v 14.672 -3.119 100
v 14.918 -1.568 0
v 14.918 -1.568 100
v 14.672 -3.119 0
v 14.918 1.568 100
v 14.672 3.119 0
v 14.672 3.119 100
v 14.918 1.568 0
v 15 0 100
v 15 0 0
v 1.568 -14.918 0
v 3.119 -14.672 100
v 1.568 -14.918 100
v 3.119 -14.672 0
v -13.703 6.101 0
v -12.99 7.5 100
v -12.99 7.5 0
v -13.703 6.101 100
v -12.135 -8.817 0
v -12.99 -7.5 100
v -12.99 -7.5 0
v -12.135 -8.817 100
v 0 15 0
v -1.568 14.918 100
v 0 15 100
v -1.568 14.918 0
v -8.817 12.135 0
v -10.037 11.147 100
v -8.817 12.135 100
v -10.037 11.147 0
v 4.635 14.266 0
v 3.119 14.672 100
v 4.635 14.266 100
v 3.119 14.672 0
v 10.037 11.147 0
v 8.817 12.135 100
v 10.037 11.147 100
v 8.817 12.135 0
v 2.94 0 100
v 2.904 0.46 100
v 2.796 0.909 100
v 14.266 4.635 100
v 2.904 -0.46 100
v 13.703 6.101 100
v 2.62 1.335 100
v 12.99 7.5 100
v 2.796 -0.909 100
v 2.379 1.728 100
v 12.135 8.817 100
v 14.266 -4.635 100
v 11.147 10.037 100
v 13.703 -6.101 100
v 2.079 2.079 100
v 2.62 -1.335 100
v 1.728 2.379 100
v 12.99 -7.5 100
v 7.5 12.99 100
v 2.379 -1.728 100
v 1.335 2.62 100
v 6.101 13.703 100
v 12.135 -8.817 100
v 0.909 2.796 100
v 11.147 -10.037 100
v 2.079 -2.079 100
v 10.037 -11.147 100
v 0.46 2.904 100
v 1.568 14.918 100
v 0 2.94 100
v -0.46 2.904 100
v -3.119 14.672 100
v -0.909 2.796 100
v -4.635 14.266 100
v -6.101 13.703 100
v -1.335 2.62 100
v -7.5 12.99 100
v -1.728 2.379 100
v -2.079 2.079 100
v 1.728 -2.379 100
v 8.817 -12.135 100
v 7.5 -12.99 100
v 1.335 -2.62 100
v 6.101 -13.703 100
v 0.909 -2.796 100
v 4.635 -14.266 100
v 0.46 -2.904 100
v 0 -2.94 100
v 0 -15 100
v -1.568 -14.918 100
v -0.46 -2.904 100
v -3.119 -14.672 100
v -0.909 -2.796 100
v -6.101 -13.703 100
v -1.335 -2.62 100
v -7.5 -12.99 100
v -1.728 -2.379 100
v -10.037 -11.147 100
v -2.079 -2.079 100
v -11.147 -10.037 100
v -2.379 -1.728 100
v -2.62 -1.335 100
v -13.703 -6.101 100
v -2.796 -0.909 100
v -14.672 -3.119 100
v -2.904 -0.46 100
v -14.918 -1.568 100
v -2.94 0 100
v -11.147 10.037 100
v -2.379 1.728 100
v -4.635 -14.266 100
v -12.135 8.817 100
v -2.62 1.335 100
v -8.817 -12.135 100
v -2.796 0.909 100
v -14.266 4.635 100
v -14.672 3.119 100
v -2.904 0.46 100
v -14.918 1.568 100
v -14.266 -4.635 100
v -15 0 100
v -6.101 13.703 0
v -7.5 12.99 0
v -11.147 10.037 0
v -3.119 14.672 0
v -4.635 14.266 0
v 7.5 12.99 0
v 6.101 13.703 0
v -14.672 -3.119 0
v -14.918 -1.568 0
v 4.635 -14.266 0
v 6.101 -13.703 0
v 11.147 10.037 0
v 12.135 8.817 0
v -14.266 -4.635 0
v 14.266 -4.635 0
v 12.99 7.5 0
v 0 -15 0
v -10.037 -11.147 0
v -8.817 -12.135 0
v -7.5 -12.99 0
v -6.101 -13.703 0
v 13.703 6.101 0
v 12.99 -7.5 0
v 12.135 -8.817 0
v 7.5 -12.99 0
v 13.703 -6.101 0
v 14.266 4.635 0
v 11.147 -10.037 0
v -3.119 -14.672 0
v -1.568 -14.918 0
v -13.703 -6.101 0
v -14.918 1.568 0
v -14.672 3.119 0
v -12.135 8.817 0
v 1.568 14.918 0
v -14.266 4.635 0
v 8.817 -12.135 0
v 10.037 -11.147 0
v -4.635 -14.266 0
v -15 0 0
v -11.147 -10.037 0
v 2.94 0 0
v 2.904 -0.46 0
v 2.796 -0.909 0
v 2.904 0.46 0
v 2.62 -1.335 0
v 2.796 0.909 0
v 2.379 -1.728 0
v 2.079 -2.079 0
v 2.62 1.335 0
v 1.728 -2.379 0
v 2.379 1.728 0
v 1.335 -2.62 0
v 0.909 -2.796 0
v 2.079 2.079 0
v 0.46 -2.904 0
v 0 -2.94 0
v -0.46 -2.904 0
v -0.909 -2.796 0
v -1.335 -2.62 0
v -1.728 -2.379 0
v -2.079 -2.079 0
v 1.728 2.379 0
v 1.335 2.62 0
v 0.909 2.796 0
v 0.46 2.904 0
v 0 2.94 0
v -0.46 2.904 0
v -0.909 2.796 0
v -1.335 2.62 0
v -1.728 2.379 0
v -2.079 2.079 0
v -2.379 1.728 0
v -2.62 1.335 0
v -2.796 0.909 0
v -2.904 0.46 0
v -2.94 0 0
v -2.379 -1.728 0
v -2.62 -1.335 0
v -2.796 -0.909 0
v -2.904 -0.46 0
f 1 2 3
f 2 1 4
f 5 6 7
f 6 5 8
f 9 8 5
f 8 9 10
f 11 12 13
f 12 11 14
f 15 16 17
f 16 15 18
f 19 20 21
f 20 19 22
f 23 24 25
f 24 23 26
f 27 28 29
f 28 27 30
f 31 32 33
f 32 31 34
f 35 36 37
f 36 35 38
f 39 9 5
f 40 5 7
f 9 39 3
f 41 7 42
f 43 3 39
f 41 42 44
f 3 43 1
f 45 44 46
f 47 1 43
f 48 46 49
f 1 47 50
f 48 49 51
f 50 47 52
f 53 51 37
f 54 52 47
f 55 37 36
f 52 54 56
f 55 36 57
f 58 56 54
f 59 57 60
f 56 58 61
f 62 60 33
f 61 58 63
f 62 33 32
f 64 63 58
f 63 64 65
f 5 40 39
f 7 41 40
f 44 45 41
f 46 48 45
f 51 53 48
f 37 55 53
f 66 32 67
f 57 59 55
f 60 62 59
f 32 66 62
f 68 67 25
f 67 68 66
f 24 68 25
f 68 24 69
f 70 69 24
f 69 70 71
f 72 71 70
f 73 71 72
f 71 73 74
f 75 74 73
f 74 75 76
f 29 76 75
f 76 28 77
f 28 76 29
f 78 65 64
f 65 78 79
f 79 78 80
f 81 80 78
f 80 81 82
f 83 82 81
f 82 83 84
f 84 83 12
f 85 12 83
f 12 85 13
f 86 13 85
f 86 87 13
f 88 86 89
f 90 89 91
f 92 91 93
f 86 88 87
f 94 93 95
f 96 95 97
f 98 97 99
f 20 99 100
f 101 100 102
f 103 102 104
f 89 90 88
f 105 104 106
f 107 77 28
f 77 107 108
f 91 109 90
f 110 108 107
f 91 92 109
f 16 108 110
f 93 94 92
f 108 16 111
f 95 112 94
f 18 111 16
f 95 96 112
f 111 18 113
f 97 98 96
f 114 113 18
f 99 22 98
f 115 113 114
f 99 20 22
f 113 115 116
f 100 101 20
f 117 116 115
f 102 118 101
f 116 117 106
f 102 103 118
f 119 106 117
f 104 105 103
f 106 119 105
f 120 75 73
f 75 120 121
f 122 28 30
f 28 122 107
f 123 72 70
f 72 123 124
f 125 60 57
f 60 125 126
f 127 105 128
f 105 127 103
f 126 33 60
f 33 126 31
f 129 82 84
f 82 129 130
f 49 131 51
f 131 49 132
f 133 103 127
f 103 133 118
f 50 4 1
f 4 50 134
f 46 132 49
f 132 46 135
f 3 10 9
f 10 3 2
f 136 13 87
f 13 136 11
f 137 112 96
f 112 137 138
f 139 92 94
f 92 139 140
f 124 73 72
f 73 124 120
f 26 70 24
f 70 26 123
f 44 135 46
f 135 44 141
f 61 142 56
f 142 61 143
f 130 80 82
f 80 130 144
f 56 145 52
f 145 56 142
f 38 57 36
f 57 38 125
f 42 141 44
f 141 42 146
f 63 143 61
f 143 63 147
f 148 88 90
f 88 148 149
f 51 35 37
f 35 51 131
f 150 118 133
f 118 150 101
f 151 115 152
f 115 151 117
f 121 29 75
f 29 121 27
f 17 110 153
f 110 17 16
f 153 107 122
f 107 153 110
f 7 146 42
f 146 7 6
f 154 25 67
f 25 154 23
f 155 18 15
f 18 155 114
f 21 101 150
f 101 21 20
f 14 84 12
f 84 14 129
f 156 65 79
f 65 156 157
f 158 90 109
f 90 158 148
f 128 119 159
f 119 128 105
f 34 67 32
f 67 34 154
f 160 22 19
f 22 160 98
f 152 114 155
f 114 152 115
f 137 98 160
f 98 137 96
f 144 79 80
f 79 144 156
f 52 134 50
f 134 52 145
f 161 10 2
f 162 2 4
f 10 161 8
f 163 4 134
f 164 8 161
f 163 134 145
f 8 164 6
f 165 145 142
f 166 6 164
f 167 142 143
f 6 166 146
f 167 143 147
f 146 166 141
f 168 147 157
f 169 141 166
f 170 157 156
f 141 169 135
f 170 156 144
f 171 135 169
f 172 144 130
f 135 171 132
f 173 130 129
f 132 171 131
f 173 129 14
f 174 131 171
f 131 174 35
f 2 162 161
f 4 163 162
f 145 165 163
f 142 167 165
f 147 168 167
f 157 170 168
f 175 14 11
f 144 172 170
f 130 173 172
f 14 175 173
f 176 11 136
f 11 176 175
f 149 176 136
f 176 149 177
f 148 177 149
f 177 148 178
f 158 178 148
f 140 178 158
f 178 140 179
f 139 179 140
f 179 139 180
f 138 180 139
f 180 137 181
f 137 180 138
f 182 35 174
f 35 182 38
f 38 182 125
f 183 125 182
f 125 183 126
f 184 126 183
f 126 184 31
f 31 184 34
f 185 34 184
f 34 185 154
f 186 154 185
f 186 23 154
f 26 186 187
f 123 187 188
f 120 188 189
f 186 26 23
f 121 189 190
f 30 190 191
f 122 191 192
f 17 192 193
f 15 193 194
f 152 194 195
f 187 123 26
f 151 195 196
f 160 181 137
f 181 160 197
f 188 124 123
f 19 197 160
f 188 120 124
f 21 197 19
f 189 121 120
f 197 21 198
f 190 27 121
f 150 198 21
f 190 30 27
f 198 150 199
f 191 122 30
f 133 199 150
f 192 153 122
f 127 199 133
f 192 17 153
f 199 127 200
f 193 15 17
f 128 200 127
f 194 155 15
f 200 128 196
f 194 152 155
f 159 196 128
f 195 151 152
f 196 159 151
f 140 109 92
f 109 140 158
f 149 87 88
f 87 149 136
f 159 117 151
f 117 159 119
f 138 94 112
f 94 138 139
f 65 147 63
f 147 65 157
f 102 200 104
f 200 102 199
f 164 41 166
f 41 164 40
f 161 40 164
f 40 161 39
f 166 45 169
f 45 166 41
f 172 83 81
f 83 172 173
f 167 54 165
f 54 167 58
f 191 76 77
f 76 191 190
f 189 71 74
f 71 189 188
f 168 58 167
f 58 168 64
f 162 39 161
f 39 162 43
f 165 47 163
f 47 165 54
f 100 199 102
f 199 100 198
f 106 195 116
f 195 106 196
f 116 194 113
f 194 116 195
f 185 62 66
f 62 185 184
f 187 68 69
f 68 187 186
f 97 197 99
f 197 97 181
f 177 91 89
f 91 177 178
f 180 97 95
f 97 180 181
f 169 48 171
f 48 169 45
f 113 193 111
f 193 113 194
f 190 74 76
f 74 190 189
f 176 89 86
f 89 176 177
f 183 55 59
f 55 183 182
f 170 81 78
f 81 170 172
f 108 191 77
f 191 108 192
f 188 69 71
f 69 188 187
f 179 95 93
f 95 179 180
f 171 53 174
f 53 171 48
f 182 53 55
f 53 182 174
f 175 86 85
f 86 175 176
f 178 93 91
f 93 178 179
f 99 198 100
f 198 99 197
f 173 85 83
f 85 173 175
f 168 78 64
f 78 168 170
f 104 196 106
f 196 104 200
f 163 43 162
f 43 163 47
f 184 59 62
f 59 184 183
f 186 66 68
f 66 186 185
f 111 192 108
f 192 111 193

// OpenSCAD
        // Generation: 3 | Session: test-env-id
        wall_thickness = 2.5999999999999996;
        bore_clearance = 0.9400000000000002;
        roller_radius = 15.0;
        
        module roller() {
            difference() {
                cylinder(h=100, r=roller_radius, $fn=60);
                translate([0,0,-5])
                    cylinder(h=110, r=bore_clearance + 2, $fn=40);
            }
        }
        roller();
        
